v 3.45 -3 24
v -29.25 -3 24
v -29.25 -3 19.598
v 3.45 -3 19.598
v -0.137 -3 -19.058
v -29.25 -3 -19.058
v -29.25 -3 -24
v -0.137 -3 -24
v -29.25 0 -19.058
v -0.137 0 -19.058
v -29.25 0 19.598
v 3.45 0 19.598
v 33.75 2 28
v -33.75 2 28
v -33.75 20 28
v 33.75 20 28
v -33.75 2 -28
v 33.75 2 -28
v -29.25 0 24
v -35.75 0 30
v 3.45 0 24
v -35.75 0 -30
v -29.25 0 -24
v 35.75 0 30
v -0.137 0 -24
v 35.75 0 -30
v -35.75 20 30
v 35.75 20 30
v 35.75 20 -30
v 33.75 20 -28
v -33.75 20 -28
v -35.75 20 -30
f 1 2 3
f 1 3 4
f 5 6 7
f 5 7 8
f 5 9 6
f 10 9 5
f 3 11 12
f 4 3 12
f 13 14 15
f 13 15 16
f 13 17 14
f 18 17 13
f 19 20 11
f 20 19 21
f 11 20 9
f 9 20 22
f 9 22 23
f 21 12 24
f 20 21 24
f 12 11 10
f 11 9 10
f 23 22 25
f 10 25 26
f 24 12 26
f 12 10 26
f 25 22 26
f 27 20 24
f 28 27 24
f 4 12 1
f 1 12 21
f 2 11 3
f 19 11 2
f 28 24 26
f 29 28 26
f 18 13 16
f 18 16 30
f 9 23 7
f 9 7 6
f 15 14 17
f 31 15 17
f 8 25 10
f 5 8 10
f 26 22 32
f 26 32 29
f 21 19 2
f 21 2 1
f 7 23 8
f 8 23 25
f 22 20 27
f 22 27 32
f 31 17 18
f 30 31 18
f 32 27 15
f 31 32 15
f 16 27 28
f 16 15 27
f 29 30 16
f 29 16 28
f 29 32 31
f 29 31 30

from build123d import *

# Parameters (mm, degrees)
CROQUIS1_W              = 71.5
CROQUIS1_H              = 60
SALIENTE_EXTRUIR1_DEPTH = 20
VACIADO1_T              = -2
CROQUIS3_W              = 32.700305435
CROQUIS3_H              = 4.402483211
CROQUIS3_W_2            = 29.112946205
CROQUIS3_H_2            = 4.942332104
SALIENTE_EXTRUIR2_DEPTH = 3


with BuildPart() as part:
    # Croquis1 → Saliente-Extruir1 (new body)
    with BuildSketch(Plane(origin=(0, 0, 0), x_dir=(1, 0, 0), z_dir=(0, 1, 0))):
        Rectangle(CROQUIS1_W, CROQUIS1_H)
    extrude(amount=SALIENTE_EXTRUIR1_DEPTH)

    # Vaciado1
    vaciado1_openings = [part.faces().sort_by_distance(p)[0] for p in [
        (0, 20, 0),
    ]]
    offset(amount=VACIADO1_T, openings=vaciado1_openings, kind=Kind.INTERSECTION)

    # Croquis3 → Saliente-Extruir2 (add)
    with BuildSketch(Plane.XZ):
        with Locations((-12.899847283, 21.798758394)):
            Rectangle(CROQUIS3_W, CROQUIS3_H)
        with Locations((-14.693526898, -21.528833948)):
            Rectangle(CROQUIS3_W_2, CROQUIS3_H_2)
    extrude(amount=SALIENTE_EXTRUIR2_DEPTH)


solid = part.part
